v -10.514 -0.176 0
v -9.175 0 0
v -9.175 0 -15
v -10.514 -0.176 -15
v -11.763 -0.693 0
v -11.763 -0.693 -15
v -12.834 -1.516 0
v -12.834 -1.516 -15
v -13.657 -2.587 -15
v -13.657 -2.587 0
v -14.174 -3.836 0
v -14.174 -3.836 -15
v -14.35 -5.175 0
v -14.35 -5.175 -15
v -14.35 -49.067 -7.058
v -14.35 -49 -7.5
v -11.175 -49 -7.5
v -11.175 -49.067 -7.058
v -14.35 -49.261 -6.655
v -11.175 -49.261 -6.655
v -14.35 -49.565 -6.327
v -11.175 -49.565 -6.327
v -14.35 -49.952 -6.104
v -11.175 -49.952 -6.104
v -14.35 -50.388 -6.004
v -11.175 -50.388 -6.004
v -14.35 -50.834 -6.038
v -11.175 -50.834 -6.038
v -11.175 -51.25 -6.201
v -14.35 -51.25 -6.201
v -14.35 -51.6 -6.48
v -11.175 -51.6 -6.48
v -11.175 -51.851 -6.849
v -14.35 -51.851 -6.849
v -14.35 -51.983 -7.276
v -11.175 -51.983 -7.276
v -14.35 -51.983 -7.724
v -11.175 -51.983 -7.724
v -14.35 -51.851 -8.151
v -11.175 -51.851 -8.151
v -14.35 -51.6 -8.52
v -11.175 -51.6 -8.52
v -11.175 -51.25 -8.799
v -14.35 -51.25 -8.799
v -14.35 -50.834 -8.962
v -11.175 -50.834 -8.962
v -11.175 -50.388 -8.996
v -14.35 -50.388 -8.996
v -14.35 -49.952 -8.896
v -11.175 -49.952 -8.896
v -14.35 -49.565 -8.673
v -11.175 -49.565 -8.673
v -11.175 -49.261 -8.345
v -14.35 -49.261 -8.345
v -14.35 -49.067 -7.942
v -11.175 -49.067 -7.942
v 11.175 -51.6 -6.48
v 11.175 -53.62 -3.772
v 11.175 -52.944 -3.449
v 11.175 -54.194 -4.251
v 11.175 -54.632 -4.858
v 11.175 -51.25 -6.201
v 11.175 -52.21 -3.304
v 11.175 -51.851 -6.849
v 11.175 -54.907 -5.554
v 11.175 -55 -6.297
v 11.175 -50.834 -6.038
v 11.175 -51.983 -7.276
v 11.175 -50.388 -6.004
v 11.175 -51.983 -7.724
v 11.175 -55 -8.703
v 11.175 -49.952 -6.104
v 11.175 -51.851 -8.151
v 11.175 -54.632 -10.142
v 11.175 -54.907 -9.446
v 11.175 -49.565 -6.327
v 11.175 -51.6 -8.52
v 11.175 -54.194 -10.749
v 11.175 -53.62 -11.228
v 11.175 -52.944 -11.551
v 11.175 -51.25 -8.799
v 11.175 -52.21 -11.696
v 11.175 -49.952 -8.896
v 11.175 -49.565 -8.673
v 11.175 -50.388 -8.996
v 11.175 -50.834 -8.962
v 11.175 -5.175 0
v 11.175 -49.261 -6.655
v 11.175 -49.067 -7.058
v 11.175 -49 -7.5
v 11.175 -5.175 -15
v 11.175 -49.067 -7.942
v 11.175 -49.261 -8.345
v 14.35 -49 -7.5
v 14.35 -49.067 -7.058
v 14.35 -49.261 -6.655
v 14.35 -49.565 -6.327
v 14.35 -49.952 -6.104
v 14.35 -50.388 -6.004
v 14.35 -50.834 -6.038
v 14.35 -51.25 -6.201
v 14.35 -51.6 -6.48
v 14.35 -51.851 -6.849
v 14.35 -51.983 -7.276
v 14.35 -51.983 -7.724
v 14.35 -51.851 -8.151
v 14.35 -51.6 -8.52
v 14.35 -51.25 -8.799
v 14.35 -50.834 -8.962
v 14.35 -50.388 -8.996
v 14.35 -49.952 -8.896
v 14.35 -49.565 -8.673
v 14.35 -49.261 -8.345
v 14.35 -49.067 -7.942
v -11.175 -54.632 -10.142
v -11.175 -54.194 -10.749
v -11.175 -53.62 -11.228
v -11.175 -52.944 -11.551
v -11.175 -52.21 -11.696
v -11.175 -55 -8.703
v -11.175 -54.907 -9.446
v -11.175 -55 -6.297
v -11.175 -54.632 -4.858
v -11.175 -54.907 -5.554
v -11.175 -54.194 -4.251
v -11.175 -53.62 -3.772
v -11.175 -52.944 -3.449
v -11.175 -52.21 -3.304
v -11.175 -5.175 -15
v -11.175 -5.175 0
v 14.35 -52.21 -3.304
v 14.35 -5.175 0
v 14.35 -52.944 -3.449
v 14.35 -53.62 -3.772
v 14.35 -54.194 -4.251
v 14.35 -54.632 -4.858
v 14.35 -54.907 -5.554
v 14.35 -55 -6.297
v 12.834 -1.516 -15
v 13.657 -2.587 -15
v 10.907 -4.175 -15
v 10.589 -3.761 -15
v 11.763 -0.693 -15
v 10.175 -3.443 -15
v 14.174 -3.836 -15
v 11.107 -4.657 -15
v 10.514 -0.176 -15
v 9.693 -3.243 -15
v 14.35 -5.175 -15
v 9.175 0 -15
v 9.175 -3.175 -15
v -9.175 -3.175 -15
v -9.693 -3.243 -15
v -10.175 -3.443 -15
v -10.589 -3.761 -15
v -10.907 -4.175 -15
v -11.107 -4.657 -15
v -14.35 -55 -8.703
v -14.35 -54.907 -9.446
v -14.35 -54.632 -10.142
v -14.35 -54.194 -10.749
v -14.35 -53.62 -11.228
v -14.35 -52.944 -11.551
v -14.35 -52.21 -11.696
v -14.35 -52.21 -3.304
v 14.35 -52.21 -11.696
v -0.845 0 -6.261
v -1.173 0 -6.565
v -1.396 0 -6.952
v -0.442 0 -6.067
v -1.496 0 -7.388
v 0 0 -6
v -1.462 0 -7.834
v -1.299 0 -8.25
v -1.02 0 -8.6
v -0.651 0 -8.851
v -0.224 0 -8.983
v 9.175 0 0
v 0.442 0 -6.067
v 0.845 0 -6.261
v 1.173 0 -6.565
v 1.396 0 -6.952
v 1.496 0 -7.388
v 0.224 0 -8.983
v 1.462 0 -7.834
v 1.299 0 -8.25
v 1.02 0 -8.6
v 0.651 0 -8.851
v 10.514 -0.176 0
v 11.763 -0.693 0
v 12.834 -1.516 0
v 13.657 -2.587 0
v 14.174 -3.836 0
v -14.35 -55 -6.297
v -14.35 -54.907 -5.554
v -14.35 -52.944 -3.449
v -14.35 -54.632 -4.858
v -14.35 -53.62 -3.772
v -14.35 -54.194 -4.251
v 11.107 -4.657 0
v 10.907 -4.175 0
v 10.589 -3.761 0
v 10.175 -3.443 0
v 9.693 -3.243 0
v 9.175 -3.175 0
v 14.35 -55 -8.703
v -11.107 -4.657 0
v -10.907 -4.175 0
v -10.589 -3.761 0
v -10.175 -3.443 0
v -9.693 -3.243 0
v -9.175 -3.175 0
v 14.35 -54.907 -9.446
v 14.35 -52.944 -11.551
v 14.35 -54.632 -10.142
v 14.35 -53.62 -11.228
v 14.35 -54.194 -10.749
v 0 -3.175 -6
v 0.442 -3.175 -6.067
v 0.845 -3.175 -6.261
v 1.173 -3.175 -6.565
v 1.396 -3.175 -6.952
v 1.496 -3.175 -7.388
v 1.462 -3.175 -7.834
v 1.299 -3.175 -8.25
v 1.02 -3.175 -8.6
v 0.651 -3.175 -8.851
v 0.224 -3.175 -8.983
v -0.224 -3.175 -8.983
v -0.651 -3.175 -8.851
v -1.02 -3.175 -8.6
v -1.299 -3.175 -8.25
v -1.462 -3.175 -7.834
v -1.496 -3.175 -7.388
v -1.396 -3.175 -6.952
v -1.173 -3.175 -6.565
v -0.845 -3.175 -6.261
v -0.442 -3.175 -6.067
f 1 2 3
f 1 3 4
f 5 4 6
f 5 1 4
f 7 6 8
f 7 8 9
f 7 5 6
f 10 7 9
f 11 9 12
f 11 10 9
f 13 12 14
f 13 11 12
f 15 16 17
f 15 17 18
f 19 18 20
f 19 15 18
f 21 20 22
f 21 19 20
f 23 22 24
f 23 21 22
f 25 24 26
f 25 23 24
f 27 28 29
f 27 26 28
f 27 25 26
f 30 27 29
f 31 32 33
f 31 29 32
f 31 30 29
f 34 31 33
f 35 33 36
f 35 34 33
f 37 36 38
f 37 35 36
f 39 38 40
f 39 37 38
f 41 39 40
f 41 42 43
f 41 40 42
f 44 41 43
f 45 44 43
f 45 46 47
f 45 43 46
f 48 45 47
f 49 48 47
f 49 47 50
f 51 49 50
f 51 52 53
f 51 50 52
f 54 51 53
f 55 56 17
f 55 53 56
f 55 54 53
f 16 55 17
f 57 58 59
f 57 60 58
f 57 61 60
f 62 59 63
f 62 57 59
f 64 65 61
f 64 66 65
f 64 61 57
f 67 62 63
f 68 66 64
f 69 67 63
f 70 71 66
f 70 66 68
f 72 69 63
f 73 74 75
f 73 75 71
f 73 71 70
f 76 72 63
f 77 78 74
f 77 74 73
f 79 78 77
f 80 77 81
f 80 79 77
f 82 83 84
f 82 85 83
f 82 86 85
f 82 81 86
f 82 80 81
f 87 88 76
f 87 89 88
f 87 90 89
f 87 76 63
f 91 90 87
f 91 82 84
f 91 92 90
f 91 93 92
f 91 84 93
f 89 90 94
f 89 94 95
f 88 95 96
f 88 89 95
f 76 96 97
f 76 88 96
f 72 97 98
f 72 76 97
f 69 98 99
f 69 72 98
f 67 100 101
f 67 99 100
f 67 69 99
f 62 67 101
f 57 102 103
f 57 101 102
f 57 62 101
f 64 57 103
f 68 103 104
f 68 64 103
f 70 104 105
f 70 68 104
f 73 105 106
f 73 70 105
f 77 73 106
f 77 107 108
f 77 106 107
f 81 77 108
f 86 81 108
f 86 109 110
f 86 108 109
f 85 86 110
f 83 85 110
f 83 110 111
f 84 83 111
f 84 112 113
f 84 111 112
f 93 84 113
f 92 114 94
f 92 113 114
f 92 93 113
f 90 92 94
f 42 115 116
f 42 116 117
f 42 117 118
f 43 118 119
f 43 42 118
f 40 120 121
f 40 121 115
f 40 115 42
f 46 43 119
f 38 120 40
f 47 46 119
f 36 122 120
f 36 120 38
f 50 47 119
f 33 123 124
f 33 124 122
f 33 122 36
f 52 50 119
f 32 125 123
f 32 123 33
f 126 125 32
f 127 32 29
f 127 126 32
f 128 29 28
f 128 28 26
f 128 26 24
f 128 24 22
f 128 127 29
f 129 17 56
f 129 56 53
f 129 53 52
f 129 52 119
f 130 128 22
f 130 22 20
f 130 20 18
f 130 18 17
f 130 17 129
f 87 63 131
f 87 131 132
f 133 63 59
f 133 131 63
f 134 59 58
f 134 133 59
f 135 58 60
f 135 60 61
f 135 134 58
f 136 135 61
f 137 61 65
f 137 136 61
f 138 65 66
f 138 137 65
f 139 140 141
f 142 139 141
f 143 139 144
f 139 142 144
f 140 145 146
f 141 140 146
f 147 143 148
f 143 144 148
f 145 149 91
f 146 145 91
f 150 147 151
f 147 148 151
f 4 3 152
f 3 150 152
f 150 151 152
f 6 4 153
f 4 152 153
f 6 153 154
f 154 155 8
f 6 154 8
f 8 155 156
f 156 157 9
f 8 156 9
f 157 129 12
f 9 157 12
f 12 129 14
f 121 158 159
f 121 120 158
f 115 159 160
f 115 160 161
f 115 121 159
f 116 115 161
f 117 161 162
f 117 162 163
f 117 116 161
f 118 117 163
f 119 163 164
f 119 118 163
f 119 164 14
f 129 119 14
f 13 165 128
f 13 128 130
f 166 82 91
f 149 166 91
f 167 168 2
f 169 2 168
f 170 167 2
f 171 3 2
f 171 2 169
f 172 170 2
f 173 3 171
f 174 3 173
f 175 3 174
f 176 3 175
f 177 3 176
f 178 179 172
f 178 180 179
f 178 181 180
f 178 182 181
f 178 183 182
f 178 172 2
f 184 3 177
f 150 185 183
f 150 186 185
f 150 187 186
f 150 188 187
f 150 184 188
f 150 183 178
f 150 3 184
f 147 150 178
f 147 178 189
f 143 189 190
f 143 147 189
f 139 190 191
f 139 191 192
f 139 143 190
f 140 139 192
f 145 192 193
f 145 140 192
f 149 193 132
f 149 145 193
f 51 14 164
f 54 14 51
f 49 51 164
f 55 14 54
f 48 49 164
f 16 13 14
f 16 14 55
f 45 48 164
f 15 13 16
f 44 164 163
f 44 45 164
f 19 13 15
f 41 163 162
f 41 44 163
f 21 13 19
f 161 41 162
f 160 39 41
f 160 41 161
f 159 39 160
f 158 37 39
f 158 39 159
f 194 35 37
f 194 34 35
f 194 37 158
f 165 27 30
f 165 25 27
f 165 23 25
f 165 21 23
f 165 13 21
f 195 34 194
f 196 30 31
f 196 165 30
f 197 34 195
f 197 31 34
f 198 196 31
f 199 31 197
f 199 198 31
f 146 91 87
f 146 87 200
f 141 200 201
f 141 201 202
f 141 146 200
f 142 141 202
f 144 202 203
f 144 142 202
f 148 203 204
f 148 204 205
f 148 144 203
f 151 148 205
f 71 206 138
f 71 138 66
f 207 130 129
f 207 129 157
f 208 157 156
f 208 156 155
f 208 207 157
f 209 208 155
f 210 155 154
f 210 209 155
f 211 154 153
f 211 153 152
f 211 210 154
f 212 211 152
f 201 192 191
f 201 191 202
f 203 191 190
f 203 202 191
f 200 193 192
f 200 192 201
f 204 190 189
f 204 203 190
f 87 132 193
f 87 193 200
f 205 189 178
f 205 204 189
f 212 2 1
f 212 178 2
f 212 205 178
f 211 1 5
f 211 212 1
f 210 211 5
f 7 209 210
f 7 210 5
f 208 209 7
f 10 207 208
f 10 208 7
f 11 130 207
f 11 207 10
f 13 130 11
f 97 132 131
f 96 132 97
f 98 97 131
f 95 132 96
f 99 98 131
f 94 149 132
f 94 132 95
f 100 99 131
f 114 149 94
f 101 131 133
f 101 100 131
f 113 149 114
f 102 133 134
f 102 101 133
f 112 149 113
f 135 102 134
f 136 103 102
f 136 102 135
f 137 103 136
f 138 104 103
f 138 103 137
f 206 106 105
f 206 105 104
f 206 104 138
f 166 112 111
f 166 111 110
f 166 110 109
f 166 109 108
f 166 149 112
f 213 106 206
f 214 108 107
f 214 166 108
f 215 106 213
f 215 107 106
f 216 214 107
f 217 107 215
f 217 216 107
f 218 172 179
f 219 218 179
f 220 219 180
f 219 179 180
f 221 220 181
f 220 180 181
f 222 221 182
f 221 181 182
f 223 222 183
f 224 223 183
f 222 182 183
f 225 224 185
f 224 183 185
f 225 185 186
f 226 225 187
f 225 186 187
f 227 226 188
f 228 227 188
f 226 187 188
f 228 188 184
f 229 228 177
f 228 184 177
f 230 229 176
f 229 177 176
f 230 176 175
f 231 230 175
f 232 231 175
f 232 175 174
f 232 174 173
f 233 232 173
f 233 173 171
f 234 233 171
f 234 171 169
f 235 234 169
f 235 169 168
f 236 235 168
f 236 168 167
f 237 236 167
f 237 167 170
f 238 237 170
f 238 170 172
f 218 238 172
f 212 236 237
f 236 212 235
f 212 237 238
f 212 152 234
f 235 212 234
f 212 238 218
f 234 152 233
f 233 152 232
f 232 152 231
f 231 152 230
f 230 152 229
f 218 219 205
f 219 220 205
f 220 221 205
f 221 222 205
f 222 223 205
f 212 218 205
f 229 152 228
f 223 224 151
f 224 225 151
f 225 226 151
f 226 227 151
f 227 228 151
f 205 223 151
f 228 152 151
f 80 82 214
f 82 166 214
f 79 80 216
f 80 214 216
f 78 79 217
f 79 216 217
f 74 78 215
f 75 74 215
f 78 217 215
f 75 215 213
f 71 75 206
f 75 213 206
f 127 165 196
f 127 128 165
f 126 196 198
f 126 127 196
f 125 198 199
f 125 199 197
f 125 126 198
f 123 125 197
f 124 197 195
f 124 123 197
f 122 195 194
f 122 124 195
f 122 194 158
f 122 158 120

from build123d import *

# Parameters (mm, degrees)
SKETCH8_W                    = 28.7
SKETCH8_H                    = 15
BASE_FLANGE1_DEPTH           = 3.175
EDGE_FLANGE1_STRIP_W         = 16.7
EDGE_FLANGE1_STRIP_H         = 3.175
EDGE_FLANGE1_STRIP_CUT_DEPTH = 15
EDGE_FLANGE1_DEPTH           = 15
EDGE_FLANGE2_STRIP_W         = 16.7
EDGE_FLANGE2_STRIP_H         = 3.175
EDGE_FLANGE2_STRIP_CUT_DEPTH = 15
EDGE_FLANGE2_DEPTH           = 15
SKETCH19_R                   = 1.5
CUT_EXTRUDE1_DEPTH           = 10
CUT_EXTRUDE2_DEPTH           = 64.825465137
CUT_EXTRUDE2_DEPTH_BACK      = 64.825465137
CUT_EXTRUDE3_DEPTH           = 64.825465137
CUT_EXTRUDE3_DEPTH_BACK      = 64.825465137
SKETCH21_R                   = 1.5
FILLET1_R                    = 3


# Sheet-metal steps are written as plain solids
with BuildPart() as part:
    # Sketch8 → Base-Flange1 (new body)
    with BuildSketch(Plane(origin=(0, 0, 0), x_dir=(1, 0, 0), z_dir=(0, 1, 0))):
        with Locations((0, 7.5)):
            Rectangle(SKETCH8_W, SKETCH8_H)
    extrude(amount=-BASE_FLANGE1_DEPTH)

    # Edge-Flange1 strip (across the edge) → Edge-Flange1 strip cut (cut)
    with BuildSketch(Plane(origin=(14.35, -3.175, -15), x_dir=(-1, 0, 0), z_dir=(0, 0, 1))):
        with Locations((-3.175, -1.5875)):
            Rectangle(EDGE_FLANGE1_STRIP_W, EDGE_FLANGE1_STRIP_H)
    extrude(amount=EDGE_FLANGE1_STRIP_CUT_DEPTH, mode=Mode.SUBTRACT)

    # Edge-Flange1 section (across the edge) → Edge-Flange1 (add)
    with BuildSketch(Plane(origin=(14.35, -3.175, -15), x_dir=(-1, 0, 0), z_dir=(0, 0, 1))):
        with BuildLine():
            Line((0, 2), (0, 51.825))
            Line((0, 51.825), (3.175, 51.825))
            Line((3.175, 51.825), (3.175, 2))
            ThreePointArc((3.175, 2), (3.760786438, 0.585786438), (5.175, 0))
            Line((5.175, 0), (5.175, -3.175))
            ThreePointArc((5.175, -3.175), (1.515722407, -1.659277593), (0, 2))
        make_face()
    extrude(amount=EDGE_FLANGE1_DEPTH)

    # Edge-Flange2 strip (across the edge) → Edge-Flange2 strip cut (cut)
    with BuildSketch(Plane(origin=(-14.35, -3.175, 0), x_dir=(1, 0, 0), z_dir=(0, 0, -1))):
        with Locations((-3.175, -1.5875)):
            Rectangle(EDGE_FLANGE2_STRIP_W, EDGE_FLANGE2_STRIP_H)
    extrude(amount=EDGE_FLANGE2_STRIP_CUT_DEPTH, mode=Mode.SUBTRACT)

    # Edge-Flange2 section (across the edge) → Edge-Flange2 (add)
    with BuildSketch(Plane(origin=(-14.35, -3.175, 0), x_dir=(1, 0, 0), z_dir=(0, 0, -1))):
        with BuildLine():
            Line((0, 2), (0, 51.825))
            Line((0, 51.825), (3.175, 51.825))
            Line((3.175, 51.825), (3.175, 2))
            ThreePointArc((3.175, 2), (3.760786438, 0.585786438), (5.175, 0))
            Line((5.175, 0), (5.175, -3.175))
            ThreePointArc((5.175, -3.175), (1.515722407, -1.659277593), (0, 2))
        make_face()
    extrude(amount=EDGE_FLANGE2_DEPTH)

    # Sketch19 → Cut-Extrude1 (cut)
    with BuildSketch(Plane(origin=(0, 0, 0), x_dir=(1, 0, 0), z_dir=(0, 1, 0))):
        with Locations(Location((0, 7.5, 0), (0, 0, 270))):
            Circle(SKETCH19_R)
    extrude(amount=-CUT_EXTRUDE1_DEPTH, mode=Mode.SUBTRACT)

    # Sketch20 → Cut-Extrude2 (cut, two sides: drawn at the far end of the back side and taken through both)
    with BuildSketch(Plane(origin=(14.35, 0, 0), x_dir=(0, 0, -1), z_dir=(1, 0, 0)).offset(-CUT_EXTRUDE2_DEPTH_BACK)):
        Polygon((11.5, -55), (15, -5.175), (15, -55), align=None)
        Polygon((3.5, -55), (0, -5.175), (0, -55), align=None)
    extrude(amount=CUT_EXTRUDE2_DEPTH + CUT_EXTRUDE2_DEPTH_BACK, mode=Mode.SUBTRACT)

    # Sketch21 → Cut-Extrude3 (cut, two sides: drawn at the far end of the back side and taken through both)
    with BuildSketch(Plane(origin=(14.35, 0, 0), x_dir=(0, 0, -1), z_dir=(1, 0, 0)).offset(-CUT_EXTRUDE3_DEPTH_BACK)):
        with Locations(Location((7.5, -50.5, 0), (0, 0, 90))):
            Circle(SKETCH21_R)
    extrude(amount=CUT_EXTRUDE3_DEPTH + CUT_EXTRUDE3_DEPTH_BACK, mode=Mode.SUBTRACT)

    # Fillet1
    fillet1_edges = [part.edges().sort_by_distance(p)[0] for p in [
        (12.7625, -55, -3.5),
        (12.7625, -55, -11.5),
        (-12.7625, -55, -3.5),
        (-12.7625, -55, -11.5),
    ]]
    fillet(fillet1_edges, radius=FILLET1_R)


solid = part.part
